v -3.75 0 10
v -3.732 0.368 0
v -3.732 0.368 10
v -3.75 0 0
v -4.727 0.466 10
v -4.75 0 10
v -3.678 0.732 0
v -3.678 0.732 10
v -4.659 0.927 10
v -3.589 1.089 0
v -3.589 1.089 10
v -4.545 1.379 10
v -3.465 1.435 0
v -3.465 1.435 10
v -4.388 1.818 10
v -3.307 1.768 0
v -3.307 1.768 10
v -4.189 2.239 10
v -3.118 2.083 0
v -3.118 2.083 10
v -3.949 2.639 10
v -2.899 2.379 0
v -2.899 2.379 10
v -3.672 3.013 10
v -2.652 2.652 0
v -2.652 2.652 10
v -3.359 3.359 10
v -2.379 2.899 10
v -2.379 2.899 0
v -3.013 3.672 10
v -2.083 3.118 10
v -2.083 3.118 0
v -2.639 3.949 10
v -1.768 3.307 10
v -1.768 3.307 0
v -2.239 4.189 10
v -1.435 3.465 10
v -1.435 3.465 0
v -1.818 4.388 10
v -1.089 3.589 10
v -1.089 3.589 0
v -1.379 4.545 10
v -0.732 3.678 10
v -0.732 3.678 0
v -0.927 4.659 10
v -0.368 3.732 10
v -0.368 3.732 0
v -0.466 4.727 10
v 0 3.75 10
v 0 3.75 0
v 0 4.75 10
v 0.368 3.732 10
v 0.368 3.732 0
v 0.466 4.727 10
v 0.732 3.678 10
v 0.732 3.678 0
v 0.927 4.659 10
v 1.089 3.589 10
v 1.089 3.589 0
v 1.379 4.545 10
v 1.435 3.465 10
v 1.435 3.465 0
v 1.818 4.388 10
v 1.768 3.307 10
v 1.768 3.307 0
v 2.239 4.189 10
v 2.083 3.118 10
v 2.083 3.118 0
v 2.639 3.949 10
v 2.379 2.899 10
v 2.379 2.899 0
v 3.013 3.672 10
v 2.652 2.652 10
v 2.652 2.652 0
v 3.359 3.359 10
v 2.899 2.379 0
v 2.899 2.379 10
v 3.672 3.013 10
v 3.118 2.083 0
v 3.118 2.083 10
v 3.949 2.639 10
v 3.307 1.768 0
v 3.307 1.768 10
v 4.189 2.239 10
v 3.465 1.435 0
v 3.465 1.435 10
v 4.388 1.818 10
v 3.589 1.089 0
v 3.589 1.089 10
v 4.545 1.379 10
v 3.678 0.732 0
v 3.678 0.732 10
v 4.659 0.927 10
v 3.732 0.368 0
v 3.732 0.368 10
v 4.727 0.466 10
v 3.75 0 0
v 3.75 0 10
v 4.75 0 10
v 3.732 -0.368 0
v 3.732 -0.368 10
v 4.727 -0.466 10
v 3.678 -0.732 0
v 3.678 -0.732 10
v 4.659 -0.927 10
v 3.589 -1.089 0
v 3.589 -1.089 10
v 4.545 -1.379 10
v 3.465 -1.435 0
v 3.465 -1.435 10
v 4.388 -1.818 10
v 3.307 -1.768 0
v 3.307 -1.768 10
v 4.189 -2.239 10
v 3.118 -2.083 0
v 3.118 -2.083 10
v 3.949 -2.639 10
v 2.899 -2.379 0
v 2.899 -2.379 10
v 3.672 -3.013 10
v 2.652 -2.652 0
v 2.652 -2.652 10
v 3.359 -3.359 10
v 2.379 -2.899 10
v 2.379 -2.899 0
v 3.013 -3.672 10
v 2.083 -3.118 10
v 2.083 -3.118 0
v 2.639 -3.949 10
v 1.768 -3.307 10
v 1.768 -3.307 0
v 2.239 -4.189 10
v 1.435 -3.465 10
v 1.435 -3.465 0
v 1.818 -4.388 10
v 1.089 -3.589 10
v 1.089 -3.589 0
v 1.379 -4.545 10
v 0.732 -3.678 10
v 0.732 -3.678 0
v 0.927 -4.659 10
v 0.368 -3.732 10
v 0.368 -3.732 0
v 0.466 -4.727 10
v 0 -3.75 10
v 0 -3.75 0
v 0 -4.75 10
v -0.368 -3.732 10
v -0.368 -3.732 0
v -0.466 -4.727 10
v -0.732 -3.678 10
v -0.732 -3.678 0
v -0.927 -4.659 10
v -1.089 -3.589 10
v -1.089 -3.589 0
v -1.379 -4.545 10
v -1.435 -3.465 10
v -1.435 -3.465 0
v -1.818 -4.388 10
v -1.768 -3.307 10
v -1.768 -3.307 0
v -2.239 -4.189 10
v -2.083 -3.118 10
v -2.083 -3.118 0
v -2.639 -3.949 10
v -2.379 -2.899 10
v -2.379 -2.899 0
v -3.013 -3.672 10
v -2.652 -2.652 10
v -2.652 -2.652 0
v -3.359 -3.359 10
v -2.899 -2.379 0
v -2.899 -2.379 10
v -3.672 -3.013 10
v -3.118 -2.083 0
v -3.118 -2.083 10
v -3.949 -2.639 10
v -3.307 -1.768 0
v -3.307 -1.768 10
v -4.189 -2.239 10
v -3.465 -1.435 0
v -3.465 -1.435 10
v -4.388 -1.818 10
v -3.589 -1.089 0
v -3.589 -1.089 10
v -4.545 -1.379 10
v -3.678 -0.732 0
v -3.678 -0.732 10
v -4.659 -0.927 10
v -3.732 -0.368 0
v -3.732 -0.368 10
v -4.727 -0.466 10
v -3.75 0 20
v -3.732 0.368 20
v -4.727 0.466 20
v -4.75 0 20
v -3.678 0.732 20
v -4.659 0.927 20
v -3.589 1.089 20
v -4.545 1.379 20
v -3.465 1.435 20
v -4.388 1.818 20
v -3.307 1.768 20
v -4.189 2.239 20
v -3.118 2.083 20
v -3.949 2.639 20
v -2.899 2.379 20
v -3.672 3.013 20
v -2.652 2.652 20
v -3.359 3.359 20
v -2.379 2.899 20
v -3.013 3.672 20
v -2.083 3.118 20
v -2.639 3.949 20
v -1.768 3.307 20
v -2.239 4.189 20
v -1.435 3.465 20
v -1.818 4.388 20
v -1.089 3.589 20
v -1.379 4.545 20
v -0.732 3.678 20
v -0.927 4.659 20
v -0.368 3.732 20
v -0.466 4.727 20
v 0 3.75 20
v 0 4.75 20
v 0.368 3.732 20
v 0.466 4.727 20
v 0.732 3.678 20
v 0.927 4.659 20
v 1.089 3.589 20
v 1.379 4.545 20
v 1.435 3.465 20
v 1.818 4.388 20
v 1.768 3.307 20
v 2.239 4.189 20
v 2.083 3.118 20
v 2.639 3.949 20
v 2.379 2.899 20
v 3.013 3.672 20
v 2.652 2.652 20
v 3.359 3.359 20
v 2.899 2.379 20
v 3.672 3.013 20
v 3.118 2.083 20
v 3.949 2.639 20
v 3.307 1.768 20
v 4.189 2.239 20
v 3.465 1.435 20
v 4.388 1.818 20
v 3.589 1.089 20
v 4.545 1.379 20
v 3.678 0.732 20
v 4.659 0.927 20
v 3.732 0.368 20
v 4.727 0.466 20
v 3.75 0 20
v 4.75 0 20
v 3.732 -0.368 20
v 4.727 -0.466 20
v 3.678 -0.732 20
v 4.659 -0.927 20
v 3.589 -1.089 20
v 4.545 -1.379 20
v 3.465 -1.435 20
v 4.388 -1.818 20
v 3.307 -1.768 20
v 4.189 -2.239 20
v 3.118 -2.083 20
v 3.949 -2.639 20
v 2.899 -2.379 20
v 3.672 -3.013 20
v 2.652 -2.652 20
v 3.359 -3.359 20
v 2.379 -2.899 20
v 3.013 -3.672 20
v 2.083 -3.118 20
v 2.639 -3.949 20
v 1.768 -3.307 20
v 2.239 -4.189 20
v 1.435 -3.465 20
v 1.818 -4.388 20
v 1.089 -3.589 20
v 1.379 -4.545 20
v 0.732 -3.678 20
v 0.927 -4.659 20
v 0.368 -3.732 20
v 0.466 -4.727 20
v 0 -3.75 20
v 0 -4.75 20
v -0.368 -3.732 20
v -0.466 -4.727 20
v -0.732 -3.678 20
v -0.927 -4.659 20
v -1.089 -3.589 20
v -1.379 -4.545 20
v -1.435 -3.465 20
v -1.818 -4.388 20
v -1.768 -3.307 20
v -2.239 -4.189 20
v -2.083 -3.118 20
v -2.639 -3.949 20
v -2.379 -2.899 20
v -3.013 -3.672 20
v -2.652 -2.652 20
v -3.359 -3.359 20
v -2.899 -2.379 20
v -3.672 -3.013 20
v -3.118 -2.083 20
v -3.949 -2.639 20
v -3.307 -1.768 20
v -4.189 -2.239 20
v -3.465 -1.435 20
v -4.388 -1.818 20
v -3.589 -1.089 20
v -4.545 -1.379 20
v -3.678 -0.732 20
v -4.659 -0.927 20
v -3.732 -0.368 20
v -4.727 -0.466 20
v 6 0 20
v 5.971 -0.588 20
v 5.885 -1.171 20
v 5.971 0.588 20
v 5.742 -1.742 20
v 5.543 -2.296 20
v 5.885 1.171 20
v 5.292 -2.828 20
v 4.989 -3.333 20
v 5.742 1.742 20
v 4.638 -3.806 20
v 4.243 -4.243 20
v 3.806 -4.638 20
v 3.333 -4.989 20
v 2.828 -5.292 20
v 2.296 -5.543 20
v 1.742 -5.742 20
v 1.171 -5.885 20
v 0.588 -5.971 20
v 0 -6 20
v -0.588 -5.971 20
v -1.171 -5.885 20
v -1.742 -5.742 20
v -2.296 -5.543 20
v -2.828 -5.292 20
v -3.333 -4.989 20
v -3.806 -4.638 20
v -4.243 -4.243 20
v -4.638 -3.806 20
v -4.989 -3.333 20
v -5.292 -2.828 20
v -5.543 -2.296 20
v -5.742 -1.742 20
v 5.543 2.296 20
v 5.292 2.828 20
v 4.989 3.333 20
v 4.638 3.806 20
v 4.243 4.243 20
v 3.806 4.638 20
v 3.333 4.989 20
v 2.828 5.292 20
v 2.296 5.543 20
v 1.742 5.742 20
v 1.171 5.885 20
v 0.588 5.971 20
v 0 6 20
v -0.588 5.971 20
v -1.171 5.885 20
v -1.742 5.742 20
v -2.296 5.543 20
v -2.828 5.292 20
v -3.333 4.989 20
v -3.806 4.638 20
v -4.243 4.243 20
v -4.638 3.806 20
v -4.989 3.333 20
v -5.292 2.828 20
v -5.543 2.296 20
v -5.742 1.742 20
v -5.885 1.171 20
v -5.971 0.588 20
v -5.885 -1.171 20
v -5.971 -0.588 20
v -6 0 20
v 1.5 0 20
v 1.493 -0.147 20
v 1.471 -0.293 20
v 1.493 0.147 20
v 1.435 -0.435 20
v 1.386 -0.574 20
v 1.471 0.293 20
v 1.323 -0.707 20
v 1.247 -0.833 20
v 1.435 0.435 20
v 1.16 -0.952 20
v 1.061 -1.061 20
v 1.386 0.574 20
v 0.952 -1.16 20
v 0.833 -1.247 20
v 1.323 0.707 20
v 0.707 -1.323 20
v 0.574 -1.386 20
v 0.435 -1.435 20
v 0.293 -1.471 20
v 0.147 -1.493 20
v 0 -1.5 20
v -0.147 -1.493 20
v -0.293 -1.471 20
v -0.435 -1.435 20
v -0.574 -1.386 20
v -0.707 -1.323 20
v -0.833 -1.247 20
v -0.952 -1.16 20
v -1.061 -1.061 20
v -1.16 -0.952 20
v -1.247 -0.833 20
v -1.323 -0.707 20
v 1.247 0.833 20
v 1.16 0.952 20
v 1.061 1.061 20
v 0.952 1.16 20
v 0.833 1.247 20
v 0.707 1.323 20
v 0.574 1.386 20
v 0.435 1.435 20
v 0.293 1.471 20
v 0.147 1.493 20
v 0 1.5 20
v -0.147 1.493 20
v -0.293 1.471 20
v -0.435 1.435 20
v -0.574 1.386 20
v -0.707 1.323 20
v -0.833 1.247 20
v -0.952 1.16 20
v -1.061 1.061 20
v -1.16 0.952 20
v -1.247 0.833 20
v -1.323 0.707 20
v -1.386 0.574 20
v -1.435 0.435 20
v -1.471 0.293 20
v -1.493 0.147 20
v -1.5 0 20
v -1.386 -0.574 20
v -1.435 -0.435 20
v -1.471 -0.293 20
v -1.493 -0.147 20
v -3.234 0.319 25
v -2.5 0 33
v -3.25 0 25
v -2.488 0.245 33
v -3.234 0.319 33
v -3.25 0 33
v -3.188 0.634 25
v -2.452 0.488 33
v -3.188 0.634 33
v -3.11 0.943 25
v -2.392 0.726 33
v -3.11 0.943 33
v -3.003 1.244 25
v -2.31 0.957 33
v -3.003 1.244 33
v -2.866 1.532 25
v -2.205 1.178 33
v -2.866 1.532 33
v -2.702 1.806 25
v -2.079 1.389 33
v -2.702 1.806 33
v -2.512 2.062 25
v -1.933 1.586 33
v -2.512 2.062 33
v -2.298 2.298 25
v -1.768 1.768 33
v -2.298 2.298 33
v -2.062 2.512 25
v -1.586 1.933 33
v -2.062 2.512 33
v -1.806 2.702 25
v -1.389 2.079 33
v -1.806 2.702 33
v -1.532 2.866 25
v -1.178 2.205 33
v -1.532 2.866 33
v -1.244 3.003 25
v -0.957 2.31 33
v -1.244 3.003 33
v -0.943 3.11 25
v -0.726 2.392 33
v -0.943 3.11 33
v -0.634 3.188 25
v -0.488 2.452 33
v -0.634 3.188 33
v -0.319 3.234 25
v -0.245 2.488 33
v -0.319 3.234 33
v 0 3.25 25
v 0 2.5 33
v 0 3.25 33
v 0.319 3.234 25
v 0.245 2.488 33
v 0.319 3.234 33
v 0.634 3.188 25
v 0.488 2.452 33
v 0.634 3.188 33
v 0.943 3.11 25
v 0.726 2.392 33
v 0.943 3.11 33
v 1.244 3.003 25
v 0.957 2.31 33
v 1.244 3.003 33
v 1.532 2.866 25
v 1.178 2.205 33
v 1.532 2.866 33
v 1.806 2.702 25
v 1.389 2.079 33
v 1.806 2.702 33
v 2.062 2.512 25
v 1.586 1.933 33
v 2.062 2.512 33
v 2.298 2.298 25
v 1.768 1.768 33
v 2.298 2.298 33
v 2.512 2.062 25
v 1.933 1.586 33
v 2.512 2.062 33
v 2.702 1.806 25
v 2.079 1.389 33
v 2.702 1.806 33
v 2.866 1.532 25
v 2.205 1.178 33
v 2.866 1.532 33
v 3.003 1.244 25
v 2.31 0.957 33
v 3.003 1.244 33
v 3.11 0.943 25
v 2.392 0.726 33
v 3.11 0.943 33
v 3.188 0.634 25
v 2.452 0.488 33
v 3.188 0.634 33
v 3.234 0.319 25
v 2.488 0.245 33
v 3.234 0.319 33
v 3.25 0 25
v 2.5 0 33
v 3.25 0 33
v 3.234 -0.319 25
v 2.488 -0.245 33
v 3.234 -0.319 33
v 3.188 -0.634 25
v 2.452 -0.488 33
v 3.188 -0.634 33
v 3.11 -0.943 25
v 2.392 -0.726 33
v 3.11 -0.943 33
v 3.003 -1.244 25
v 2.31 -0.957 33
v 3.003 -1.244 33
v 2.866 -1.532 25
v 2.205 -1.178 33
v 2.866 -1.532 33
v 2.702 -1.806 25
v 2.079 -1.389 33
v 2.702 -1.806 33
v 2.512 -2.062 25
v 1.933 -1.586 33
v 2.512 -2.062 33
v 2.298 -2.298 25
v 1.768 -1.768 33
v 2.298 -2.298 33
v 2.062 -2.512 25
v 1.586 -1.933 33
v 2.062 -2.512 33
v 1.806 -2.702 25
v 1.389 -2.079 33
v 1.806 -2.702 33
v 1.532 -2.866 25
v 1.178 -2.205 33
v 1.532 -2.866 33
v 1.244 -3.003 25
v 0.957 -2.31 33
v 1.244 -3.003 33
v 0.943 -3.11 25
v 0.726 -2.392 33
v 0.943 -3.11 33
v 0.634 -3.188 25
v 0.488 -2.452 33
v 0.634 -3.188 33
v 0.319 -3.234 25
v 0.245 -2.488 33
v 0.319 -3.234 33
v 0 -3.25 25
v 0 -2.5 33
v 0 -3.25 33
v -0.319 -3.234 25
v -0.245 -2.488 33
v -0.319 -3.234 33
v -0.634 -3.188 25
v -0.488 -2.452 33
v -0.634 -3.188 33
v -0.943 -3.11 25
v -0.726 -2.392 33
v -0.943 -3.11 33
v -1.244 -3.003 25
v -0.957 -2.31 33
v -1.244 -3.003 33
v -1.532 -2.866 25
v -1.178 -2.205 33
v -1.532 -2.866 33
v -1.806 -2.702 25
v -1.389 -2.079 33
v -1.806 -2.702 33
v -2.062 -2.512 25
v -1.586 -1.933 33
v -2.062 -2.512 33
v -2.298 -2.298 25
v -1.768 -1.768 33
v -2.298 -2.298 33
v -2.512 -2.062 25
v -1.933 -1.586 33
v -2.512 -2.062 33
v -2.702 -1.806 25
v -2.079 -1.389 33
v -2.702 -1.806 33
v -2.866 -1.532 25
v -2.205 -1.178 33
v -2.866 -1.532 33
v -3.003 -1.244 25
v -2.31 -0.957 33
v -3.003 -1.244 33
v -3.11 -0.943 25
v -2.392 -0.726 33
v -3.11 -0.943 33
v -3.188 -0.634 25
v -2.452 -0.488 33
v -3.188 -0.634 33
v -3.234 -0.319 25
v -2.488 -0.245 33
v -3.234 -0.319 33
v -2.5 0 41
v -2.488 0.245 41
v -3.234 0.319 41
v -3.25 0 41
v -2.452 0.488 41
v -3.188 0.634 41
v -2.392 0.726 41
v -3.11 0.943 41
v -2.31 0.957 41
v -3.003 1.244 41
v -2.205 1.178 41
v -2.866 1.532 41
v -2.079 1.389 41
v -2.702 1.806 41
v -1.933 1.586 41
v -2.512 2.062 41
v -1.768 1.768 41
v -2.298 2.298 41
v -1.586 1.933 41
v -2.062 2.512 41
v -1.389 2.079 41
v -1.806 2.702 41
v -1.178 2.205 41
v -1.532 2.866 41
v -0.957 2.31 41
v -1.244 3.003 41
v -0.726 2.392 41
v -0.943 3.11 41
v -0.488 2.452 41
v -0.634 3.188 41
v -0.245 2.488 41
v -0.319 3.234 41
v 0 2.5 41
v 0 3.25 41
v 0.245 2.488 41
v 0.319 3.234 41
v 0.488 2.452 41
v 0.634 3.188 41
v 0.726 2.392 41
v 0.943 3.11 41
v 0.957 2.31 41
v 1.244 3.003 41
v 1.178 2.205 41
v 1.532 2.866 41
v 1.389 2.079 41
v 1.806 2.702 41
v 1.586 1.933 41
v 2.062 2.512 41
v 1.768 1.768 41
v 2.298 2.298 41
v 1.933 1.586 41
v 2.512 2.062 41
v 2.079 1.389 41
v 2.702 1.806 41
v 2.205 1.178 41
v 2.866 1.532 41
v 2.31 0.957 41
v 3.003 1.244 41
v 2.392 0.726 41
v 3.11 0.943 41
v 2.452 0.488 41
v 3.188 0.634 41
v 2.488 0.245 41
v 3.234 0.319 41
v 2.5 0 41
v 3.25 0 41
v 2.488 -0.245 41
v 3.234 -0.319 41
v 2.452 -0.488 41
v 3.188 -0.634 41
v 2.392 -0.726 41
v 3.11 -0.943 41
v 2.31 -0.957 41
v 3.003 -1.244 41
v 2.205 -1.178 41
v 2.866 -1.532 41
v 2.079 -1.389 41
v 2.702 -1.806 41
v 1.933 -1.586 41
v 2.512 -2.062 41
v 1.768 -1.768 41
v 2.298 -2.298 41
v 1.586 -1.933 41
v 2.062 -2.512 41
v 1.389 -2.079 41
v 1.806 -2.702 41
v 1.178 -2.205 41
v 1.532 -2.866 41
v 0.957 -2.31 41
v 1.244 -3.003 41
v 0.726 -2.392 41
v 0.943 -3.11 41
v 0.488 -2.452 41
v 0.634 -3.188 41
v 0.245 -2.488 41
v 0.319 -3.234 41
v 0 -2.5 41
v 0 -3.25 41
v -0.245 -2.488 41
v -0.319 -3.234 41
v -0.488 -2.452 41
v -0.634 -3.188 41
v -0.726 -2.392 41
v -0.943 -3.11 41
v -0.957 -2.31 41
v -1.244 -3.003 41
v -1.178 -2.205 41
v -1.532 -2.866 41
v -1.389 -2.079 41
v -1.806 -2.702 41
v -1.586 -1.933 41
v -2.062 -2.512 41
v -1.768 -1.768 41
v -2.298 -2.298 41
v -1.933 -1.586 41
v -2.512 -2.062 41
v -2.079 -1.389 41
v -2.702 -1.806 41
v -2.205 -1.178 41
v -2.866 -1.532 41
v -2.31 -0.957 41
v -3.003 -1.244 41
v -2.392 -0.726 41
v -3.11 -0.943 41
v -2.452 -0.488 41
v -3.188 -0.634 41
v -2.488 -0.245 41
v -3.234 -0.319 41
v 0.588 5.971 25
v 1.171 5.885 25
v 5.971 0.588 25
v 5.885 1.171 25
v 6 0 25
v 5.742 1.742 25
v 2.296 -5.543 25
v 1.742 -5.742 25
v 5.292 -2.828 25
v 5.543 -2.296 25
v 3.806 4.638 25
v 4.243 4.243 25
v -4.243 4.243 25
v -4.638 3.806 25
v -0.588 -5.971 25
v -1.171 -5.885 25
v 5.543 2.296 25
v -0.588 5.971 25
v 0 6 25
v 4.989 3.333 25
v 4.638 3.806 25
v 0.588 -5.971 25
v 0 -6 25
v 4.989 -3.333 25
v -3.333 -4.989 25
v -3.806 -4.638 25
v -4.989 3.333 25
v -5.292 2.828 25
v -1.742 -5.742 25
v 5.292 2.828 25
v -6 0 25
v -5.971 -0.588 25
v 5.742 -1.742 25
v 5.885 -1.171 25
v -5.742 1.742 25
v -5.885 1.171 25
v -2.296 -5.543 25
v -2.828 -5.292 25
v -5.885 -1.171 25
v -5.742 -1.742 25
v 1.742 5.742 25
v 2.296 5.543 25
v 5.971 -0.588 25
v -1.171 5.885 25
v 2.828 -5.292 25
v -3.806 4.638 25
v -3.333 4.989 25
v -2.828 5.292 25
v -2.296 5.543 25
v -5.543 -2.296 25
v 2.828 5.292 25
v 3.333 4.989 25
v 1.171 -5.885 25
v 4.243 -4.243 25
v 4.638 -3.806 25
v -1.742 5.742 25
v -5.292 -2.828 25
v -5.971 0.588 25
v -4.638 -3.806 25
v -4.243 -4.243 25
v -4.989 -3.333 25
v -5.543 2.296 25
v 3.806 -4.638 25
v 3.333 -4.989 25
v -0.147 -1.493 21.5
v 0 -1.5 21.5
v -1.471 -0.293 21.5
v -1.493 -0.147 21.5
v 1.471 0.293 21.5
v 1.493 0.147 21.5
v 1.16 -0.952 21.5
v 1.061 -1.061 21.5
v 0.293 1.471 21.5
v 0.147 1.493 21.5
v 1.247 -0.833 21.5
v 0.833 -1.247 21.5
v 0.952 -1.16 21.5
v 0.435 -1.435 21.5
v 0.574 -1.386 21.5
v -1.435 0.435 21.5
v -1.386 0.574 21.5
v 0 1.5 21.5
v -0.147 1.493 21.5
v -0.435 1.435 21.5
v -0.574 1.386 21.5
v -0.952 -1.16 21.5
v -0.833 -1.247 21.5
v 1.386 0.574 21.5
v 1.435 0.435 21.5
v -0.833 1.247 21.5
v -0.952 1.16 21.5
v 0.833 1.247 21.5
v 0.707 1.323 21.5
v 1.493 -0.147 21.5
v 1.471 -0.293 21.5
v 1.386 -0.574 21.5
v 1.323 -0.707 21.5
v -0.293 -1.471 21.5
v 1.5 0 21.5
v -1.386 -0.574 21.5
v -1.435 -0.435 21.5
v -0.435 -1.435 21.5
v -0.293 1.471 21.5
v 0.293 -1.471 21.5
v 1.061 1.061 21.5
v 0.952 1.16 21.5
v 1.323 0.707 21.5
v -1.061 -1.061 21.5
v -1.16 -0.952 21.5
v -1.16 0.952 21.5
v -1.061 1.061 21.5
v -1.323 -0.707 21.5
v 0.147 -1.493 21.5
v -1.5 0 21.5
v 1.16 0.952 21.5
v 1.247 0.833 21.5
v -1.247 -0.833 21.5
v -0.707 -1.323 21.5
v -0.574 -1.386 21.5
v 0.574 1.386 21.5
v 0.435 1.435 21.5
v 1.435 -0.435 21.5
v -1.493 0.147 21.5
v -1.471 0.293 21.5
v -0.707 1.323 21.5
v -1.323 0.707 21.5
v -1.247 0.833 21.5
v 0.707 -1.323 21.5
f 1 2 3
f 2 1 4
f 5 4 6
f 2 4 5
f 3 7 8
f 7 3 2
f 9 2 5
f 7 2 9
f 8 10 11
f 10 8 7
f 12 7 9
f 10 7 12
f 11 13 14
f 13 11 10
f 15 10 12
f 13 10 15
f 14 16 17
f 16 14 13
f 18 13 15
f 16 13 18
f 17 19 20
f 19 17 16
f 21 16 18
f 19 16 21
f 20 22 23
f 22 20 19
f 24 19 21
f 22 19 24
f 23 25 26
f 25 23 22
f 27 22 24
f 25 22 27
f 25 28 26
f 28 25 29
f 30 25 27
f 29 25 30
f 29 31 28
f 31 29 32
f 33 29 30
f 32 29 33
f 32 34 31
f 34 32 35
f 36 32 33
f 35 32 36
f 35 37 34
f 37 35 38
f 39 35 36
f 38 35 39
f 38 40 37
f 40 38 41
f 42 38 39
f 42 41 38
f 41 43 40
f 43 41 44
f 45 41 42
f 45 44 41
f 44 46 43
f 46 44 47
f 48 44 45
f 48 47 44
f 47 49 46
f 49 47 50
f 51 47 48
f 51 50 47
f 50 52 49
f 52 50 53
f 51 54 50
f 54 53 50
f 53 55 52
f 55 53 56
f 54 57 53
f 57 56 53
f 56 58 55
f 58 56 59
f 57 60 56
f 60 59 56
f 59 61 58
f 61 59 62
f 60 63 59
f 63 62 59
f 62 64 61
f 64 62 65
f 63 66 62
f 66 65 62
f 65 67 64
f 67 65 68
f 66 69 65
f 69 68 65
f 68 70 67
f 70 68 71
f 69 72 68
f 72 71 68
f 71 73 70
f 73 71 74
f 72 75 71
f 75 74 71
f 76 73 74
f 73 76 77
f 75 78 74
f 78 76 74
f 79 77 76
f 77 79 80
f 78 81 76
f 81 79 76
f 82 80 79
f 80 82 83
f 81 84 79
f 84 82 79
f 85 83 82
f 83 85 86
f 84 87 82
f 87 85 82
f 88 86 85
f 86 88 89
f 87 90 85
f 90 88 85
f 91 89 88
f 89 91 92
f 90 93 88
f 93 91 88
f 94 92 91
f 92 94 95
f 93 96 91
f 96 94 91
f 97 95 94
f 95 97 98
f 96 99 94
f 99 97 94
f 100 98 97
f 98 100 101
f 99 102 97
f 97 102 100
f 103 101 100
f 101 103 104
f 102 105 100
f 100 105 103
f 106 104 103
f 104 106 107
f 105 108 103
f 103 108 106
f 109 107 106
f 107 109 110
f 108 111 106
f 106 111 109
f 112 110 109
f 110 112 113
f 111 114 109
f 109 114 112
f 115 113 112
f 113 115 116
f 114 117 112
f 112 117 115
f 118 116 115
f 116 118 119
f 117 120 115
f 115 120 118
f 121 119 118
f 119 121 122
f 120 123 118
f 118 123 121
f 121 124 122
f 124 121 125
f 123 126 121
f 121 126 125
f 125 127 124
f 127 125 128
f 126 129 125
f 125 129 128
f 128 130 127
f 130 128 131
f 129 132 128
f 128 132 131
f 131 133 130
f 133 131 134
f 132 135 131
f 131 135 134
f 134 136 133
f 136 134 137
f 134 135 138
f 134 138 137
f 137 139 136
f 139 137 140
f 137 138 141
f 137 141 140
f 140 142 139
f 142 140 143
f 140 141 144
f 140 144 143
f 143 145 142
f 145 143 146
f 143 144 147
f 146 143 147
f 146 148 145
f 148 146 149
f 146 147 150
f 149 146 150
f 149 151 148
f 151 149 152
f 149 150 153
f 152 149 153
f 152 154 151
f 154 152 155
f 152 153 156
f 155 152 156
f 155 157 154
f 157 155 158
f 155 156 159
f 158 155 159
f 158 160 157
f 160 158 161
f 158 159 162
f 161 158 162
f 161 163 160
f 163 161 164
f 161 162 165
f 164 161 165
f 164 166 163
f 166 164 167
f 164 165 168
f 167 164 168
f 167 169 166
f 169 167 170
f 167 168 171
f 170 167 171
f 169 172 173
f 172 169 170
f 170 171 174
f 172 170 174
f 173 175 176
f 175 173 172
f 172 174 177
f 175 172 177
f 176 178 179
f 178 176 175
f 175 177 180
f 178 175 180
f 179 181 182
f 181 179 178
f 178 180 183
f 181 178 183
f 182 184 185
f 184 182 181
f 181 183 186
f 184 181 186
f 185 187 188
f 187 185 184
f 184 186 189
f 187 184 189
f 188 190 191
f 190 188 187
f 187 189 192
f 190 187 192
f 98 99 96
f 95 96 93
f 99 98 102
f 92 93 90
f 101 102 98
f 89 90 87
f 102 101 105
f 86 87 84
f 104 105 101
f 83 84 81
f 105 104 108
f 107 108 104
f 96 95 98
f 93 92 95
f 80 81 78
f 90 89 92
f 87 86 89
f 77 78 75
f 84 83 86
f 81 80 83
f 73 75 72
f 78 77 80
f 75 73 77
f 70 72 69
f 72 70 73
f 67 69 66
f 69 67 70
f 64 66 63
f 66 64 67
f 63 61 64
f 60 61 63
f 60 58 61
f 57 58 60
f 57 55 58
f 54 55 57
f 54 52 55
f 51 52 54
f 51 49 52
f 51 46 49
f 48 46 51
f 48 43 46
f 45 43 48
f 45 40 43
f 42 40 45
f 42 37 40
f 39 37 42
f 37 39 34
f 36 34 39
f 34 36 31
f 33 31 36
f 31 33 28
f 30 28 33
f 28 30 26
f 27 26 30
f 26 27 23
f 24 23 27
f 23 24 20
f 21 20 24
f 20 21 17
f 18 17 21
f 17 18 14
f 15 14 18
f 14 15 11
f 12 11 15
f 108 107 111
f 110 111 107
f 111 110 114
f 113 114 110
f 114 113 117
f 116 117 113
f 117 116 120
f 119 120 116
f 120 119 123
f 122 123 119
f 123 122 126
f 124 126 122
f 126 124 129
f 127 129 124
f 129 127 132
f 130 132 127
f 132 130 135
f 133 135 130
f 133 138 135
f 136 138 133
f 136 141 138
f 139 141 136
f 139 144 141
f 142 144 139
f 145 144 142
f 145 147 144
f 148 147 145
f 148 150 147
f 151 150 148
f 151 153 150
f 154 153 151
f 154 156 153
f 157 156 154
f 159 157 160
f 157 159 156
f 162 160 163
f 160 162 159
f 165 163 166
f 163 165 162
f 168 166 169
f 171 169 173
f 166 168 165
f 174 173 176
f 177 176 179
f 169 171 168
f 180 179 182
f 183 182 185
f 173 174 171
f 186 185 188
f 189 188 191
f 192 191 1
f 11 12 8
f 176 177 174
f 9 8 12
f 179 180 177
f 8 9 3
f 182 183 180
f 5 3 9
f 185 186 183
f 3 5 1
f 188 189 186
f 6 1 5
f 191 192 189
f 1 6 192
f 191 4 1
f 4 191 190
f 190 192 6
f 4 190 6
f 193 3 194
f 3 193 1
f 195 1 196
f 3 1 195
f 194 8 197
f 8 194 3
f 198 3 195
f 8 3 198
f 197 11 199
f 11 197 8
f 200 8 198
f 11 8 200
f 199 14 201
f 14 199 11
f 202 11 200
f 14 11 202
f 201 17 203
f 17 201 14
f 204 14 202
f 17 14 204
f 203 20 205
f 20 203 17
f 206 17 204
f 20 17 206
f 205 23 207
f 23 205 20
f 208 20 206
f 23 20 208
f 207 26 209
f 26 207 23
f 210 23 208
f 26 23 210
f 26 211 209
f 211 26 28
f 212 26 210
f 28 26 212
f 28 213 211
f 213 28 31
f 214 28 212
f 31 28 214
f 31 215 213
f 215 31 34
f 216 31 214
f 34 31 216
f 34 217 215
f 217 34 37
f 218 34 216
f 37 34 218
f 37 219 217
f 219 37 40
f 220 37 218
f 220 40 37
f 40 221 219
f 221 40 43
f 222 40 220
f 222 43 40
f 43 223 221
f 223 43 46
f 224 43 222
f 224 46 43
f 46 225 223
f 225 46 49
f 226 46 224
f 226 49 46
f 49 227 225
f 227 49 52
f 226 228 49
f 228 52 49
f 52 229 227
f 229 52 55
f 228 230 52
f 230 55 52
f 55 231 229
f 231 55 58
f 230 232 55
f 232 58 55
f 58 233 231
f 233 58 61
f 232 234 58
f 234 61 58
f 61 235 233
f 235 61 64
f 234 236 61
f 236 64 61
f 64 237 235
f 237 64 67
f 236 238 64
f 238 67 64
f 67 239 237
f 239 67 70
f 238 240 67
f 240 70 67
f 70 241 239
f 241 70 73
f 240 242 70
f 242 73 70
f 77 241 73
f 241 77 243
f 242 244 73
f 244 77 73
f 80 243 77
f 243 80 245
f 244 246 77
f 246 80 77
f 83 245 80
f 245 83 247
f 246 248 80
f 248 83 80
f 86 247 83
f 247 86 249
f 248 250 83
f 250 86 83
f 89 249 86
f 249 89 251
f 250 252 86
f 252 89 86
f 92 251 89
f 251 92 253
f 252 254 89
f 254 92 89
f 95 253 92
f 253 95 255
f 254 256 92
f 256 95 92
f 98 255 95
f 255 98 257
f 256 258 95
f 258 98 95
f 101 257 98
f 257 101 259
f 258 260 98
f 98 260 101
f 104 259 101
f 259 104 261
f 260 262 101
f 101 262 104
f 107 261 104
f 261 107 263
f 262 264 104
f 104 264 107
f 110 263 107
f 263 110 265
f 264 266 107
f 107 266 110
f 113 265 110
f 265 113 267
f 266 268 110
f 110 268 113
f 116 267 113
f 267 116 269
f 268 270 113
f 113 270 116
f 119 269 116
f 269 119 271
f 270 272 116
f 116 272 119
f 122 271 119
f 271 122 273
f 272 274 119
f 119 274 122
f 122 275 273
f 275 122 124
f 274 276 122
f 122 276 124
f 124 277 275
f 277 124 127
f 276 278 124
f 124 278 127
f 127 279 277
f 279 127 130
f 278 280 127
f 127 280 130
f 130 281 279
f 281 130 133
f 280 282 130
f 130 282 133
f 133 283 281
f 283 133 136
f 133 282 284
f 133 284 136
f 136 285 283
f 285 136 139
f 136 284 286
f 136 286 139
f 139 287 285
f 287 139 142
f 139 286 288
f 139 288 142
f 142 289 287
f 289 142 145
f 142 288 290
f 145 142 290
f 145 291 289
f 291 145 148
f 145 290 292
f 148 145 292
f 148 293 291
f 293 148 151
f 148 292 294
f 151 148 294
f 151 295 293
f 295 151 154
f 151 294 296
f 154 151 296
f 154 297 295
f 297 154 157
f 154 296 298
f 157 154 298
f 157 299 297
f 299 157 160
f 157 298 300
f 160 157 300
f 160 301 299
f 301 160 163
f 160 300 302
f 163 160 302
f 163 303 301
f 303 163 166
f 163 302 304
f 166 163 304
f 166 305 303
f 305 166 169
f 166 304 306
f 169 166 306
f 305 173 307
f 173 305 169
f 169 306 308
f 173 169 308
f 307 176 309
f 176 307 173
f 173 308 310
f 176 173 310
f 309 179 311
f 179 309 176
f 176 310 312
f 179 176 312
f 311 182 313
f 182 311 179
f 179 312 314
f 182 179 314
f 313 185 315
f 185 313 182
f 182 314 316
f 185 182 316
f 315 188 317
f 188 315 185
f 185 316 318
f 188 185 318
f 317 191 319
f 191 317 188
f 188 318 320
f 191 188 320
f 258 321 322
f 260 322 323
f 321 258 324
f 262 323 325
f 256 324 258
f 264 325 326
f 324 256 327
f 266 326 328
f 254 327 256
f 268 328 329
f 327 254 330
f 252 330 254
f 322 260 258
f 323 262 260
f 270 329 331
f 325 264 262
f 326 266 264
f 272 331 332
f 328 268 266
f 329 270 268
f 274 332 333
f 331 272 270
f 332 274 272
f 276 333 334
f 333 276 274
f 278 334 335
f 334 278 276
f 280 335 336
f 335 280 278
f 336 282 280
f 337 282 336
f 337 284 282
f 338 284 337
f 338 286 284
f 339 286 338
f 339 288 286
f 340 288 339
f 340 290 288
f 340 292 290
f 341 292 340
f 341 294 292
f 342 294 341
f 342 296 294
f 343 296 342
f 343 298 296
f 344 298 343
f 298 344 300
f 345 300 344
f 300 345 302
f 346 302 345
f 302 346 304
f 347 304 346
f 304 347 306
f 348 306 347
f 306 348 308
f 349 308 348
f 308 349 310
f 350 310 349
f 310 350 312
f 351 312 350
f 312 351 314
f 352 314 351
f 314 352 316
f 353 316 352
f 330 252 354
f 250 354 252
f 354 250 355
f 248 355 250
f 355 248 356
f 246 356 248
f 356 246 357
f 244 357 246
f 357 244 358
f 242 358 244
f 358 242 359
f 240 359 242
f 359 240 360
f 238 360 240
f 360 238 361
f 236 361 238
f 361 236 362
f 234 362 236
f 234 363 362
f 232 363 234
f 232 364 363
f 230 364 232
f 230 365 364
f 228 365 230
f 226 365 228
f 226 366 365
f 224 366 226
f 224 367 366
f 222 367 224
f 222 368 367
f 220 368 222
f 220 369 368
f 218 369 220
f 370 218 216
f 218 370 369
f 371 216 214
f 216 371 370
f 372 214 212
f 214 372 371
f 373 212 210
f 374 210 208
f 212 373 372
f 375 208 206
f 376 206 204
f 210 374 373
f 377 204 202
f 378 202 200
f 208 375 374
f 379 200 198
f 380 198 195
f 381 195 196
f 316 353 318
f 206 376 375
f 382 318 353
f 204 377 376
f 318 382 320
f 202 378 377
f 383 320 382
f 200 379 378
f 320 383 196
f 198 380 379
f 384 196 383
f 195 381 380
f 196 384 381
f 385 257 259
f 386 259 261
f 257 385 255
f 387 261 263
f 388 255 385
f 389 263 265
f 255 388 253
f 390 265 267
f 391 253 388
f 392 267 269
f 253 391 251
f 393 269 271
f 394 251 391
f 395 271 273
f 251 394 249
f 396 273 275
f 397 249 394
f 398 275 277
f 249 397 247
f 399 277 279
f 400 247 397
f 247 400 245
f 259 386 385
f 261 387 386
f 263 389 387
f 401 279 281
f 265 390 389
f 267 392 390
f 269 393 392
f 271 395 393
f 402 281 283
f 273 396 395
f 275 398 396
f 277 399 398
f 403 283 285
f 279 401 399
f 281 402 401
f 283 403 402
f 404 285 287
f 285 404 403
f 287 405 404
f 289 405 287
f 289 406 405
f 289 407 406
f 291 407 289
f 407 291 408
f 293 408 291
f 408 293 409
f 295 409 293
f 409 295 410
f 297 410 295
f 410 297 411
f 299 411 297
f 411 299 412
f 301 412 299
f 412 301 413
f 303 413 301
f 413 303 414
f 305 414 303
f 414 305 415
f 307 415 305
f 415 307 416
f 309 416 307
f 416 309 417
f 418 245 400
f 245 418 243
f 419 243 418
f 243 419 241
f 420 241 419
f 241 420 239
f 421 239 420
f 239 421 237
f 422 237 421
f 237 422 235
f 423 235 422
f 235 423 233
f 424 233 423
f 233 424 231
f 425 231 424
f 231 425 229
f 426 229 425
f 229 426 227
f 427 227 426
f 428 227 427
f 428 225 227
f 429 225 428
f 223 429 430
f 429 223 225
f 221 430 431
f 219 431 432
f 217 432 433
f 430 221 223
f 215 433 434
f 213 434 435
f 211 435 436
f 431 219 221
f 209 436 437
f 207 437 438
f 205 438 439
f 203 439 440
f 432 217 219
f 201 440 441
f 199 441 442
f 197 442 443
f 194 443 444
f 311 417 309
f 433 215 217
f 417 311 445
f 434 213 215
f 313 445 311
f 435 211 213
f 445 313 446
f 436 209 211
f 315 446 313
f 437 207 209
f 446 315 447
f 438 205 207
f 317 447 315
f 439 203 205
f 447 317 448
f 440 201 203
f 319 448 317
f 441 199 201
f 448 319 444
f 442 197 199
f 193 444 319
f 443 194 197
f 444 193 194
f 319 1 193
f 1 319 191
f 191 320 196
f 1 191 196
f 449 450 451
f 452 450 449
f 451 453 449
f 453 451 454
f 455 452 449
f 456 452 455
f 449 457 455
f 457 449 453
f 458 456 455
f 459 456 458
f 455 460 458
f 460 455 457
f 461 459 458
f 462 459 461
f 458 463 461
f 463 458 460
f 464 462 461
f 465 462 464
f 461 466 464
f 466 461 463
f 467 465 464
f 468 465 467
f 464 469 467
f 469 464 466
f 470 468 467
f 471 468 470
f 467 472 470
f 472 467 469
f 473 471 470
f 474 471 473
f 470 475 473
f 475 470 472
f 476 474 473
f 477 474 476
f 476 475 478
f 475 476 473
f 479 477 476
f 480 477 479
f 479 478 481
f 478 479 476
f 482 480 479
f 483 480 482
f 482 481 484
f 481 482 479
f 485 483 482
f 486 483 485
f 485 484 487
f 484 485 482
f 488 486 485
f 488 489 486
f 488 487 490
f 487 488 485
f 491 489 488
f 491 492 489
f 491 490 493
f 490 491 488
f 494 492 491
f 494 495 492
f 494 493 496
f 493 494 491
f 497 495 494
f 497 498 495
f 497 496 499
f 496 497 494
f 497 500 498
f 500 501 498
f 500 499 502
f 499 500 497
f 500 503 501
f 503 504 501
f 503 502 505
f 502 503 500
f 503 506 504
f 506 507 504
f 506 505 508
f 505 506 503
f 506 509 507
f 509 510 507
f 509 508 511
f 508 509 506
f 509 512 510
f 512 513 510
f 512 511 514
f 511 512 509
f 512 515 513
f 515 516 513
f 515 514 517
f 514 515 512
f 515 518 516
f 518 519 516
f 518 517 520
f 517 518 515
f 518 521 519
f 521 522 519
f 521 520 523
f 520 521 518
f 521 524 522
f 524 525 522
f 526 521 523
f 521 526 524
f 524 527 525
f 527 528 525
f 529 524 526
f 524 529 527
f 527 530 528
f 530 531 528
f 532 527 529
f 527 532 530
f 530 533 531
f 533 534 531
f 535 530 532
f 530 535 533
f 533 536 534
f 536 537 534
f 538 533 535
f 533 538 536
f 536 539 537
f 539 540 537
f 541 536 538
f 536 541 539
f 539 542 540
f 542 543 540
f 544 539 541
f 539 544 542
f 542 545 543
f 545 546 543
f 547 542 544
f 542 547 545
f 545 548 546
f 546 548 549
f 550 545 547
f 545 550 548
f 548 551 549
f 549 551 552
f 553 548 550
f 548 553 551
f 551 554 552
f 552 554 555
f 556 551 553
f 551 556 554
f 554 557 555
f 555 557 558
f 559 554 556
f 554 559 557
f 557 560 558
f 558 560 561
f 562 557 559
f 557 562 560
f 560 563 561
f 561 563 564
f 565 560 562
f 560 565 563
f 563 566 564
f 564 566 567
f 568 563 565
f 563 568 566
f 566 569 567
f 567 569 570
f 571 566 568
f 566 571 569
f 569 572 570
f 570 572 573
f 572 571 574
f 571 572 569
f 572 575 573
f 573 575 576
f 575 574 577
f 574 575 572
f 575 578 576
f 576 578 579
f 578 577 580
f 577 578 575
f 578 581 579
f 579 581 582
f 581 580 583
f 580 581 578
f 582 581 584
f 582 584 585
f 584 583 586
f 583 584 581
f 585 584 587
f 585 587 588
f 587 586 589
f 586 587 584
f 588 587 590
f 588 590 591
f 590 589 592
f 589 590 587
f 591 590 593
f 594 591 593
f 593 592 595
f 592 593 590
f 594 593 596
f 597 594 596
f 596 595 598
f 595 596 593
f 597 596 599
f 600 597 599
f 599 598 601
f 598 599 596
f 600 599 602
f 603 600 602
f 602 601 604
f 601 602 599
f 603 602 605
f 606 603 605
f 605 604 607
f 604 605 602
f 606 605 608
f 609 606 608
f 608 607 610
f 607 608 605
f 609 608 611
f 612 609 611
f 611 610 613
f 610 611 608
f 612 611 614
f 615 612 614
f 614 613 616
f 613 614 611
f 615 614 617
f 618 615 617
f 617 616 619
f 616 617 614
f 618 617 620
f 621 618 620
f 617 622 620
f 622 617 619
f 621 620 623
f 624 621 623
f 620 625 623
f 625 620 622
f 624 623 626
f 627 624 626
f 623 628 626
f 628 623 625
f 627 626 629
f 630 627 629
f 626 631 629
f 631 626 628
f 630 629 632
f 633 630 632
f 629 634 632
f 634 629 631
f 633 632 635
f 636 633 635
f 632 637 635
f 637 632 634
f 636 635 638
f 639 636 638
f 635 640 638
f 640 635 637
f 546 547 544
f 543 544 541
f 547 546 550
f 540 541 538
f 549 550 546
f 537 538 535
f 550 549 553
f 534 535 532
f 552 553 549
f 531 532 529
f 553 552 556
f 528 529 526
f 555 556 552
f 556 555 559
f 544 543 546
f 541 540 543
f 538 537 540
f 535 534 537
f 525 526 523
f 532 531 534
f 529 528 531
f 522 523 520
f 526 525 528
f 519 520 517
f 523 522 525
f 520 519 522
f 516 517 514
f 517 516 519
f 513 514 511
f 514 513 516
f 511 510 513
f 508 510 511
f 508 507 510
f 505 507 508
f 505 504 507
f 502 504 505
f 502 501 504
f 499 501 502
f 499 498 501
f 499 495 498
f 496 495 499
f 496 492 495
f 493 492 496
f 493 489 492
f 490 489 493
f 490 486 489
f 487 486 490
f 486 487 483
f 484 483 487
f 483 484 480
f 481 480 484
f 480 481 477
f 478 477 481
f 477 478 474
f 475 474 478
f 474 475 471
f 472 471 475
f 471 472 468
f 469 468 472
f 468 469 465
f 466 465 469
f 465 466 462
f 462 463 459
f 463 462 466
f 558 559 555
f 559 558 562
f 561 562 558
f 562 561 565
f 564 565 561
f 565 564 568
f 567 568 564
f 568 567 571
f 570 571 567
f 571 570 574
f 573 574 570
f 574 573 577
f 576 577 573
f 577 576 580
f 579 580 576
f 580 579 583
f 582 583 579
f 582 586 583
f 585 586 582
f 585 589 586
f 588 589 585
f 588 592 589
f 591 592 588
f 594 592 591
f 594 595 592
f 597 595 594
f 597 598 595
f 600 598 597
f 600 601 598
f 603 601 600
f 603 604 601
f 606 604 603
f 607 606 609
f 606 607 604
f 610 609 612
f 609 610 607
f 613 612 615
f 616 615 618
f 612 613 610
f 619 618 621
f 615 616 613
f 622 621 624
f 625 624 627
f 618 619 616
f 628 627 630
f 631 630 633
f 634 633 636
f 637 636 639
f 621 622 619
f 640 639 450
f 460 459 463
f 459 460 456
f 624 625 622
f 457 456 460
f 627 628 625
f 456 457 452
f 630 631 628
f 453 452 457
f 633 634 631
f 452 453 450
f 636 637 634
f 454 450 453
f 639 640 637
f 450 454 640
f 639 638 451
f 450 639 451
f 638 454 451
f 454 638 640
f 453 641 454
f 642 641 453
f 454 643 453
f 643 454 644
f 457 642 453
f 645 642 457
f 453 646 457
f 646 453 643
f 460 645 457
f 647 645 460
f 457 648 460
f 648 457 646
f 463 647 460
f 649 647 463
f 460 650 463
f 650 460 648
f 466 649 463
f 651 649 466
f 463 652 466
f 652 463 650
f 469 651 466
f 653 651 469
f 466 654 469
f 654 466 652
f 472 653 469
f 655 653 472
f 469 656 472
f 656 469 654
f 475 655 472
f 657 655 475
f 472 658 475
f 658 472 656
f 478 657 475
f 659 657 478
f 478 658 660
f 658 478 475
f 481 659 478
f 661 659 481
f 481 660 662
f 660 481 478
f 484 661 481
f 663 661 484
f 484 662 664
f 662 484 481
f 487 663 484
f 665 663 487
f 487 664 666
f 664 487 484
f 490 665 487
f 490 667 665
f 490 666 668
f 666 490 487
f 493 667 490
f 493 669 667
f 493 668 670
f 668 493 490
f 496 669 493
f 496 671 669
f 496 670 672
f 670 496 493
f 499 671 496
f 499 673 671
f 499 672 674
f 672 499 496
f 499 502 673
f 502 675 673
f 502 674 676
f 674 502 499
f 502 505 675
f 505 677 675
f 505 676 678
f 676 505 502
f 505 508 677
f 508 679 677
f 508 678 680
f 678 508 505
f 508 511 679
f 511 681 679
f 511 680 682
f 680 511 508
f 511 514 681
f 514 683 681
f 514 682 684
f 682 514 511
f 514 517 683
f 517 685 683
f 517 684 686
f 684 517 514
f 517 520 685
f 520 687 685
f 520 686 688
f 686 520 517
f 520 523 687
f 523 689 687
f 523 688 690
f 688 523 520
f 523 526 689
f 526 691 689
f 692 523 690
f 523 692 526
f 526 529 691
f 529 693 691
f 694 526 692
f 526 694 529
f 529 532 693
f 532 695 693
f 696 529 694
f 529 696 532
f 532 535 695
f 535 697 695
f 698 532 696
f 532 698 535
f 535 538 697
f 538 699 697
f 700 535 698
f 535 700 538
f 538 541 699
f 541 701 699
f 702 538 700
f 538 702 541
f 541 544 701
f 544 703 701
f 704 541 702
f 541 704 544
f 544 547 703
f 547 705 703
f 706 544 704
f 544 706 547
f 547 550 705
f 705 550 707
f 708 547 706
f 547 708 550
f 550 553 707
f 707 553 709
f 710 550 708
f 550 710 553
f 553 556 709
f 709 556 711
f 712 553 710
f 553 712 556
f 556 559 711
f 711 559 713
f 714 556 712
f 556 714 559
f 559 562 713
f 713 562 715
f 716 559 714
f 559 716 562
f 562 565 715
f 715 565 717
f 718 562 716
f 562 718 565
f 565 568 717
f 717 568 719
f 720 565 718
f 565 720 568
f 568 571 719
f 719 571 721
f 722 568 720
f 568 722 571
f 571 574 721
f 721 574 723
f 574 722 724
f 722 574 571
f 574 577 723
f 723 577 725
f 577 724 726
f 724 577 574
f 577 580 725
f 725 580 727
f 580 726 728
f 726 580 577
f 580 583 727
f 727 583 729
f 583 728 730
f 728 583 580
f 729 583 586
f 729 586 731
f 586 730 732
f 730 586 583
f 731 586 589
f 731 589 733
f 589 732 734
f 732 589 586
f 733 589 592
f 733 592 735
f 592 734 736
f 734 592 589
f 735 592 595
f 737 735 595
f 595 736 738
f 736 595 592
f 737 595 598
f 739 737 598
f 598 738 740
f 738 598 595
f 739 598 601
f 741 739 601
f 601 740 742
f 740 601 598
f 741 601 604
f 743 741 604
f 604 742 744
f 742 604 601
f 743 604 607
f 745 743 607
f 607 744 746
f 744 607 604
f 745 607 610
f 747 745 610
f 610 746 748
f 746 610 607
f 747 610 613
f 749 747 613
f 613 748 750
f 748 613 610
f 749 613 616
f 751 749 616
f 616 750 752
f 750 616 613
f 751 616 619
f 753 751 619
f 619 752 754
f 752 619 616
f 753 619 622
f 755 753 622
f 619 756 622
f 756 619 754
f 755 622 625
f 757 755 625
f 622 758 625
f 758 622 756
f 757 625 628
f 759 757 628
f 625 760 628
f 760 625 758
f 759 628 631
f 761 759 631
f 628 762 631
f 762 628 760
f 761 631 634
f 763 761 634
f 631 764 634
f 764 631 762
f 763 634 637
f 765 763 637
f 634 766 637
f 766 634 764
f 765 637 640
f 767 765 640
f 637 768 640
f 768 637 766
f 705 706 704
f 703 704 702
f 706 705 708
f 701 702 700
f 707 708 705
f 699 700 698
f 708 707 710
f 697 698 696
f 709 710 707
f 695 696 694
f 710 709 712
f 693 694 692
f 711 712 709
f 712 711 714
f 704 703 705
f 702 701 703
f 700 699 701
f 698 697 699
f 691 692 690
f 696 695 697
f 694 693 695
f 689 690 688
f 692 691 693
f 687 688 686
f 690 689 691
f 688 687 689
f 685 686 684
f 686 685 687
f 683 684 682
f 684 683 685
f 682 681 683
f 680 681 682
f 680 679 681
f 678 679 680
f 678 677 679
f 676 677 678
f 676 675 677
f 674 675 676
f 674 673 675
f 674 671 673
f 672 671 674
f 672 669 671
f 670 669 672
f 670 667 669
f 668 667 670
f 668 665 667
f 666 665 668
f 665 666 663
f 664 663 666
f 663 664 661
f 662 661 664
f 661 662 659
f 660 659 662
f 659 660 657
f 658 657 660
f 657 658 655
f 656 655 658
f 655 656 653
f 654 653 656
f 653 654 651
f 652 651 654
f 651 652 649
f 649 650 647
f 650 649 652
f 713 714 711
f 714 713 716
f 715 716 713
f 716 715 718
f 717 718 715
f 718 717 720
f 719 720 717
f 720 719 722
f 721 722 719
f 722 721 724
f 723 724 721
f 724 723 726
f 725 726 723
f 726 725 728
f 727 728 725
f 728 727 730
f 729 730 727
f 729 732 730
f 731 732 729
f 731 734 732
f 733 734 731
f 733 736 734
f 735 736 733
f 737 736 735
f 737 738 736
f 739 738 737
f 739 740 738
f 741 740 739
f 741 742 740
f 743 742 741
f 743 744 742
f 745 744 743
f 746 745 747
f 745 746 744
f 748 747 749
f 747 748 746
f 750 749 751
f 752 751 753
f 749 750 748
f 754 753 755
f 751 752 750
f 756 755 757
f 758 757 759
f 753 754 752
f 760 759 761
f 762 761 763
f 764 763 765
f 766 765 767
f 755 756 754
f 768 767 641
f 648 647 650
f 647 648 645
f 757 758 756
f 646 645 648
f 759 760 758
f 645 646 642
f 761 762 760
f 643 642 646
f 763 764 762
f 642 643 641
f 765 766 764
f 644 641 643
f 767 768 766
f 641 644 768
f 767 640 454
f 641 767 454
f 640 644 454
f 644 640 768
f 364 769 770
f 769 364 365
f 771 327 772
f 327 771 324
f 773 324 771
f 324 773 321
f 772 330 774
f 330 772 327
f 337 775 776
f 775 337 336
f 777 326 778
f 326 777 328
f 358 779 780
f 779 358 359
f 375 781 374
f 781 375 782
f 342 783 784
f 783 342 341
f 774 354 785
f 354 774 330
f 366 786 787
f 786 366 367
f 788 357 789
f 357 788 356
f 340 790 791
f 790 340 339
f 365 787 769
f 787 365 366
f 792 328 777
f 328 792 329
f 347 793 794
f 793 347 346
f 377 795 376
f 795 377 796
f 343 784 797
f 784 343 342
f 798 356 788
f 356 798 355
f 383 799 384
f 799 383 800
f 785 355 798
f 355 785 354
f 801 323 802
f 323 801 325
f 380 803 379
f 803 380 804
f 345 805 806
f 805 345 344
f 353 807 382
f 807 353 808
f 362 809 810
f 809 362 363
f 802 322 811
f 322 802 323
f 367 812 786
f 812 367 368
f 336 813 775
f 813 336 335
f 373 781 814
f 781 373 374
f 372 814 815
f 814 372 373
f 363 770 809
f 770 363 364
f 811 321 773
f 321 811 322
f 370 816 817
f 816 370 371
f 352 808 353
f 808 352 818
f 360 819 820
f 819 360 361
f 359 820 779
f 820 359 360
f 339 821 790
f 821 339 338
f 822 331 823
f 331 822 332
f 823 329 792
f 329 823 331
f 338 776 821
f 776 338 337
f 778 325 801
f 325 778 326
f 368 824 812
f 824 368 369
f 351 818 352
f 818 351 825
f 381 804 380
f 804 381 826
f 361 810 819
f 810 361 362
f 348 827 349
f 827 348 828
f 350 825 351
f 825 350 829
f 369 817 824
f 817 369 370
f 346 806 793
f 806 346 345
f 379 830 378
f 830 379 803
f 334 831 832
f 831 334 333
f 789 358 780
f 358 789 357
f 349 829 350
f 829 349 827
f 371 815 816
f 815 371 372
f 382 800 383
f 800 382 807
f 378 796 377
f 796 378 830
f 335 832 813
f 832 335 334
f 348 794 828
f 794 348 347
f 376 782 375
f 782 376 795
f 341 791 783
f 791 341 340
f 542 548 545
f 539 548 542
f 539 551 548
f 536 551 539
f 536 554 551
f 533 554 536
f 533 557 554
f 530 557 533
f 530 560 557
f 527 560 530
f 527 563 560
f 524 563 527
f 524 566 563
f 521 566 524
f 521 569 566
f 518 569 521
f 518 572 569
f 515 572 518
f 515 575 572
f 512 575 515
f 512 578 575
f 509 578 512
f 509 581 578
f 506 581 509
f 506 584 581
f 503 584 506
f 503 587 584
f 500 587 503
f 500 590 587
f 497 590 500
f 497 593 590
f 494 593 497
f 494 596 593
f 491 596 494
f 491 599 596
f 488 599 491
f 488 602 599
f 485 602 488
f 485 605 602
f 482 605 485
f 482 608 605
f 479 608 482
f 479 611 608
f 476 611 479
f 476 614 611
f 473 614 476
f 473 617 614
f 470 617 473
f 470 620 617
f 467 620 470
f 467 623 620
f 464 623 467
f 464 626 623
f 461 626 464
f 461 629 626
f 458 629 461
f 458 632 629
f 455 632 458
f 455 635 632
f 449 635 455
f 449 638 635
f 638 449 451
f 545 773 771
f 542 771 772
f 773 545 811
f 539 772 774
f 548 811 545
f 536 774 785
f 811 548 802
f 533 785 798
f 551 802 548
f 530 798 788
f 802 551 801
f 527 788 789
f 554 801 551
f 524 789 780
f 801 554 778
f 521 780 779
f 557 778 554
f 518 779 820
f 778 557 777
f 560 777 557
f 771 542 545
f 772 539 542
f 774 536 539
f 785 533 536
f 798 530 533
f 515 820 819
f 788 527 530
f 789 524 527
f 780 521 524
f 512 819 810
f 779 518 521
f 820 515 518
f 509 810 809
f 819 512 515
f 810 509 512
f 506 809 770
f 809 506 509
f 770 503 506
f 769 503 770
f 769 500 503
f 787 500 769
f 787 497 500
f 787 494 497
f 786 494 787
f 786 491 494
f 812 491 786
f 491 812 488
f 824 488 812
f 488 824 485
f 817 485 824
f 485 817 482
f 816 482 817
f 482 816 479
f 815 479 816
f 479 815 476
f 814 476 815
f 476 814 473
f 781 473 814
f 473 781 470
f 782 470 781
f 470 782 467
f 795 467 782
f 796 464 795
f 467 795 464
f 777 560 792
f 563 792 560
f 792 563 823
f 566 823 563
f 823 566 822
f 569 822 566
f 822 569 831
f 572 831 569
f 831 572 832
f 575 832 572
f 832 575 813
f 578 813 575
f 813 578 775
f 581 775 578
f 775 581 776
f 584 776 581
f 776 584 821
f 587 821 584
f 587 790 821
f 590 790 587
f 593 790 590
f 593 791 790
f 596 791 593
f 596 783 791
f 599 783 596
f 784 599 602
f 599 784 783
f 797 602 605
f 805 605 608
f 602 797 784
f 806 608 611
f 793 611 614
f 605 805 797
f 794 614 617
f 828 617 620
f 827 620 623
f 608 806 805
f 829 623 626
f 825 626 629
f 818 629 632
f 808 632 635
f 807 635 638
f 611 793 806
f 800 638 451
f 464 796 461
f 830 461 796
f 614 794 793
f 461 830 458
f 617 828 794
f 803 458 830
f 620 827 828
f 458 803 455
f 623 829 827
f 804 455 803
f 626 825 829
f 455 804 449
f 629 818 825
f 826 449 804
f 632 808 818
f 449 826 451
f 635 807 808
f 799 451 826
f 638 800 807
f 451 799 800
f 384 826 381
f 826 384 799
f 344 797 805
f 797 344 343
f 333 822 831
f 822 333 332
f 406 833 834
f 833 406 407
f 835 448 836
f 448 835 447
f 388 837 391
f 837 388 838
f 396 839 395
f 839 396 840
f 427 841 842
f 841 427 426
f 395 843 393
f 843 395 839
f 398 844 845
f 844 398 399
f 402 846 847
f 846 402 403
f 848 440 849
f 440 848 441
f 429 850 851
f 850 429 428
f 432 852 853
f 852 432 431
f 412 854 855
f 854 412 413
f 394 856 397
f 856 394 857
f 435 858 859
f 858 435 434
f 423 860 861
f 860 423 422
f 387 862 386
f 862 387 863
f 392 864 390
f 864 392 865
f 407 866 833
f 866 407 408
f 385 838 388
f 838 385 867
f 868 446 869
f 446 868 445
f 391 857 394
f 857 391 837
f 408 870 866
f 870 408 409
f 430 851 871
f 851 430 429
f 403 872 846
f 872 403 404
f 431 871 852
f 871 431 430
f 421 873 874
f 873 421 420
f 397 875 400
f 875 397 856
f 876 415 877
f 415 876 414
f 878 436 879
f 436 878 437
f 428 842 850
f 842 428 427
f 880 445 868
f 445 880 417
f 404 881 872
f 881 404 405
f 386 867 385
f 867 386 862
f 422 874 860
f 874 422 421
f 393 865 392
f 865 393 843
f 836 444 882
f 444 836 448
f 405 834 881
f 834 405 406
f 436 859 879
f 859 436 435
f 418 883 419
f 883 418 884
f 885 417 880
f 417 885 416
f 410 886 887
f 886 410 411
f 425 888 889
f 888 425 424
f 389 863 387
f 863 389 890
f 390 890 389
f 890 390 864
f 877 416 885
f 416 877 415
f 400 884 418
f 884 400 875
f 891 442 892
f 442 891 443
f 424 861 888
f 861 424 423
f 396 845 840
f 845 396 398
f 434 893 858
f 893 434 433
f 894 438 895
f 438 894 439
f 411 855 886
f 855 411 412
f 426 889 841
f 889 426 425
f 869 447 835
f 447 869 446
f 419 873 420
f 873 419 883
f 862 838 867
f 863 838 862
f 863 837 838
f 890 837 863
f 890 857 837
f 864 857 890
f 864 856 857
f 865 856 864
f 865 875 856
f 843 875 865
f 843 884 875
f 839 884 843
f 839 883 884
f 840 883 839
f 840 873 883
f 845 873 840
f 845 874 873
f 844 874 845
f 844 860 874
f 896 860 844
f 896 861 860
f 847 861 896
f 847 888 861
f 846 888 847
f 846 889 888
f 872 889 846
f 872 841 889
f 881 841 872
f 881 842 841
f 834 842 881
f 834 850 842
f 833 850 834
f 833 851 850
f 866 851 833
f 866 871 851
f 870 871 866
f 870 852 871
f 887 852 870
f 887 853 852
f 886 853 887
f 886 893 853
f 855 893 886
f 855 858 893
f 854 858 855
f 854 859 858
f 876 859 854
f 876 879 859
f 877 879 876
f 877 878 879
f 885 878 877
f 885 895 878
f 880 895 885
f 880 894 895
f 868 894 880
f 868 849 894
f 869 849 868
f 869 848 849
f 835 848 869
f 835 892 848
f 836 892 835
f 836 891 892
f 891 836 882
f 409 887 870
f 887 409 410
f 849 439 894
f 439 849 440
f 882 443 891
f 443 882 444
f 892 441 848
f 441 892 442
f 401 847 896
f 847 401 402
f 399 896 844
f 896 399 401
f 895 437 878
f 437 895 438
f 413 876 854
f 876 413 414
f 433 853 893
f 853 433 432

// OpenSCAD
// Hose Barb Reducer: 8mm ID to 5mm ID
// Designed for FDM printing, standing upright on Z axis.

// Global settings
$fn = 64; // High resolution for round holes

// --- Dimensions for 8mm Tubing Barbs (Bottom Section) ---
OD_8mm_bottom = 7.5;  // Outer diameter at base of barb
OD_8mm_top = 9.5;     // Outer diameter at peak of barb
Barb8_Height = 10;    // Height of each 8mm barb
Barb8_Count = 2;      // Number of barbs for 8mm side

// --- Dimensions for Collar (Middle Section) ---
Collar_Height = 5;    // Height of the collar (z=20 to z=25)
Collar_OD = 12;       // Outer diameter of the collar

// --- Dimensions for 5mm Tubing Barbs (Top Section) ---
OD_5mm_bottom = 6.5;  // Outer diameter at base of barb
OD_5mm_top = 5.0;     // Outer diameter at peak of barb
Barb5_Height = 8;     // Height of each 5mm barb
Barb5_Count = 2;      // Number of barbs for 5mm side

// --- Bore ---
Bore_Diameter = 3;    // Inner diameter of the through-hole

// --- Helper Module: Sawtooth Barb Profile ---
// Creates a single barb profile in 2D (XY plane)
// x_start: radius at bottom
// x_end: radius at top
// height: height of the barb
module barb_profile(x_start, x_end, height) {
    // The profile is a trapezoid that steps back.
    // Points: (x_start, 0) -> (x_end, height) -> (x_start, height) -> (x_start, 0)
    // Note: For the 5mm side, x_start > x_end, so it shrinks then steps out.
    polygon(points = [
        [x_start, 0],
        [x_end, height],
        [x_start, height],
        [x_start, 0]
    ]);
}

// --- Main Body Construction ---
difference() {
    union() {
        // 1. Bottom Barbs (8mm tubing)
        // Located from z=0 to z=20
        for (i = [0 : Barb8_Count - 1]) {
            translate([0, 0, i * Barb8_Height]) {
                rotate_extrude() {
                    barb_profile(OD_8mm_bottom / 2, OD_8mm_top / 2, Barb8_Height);
                }
            }
        }

        // 2. Collar
        // Located from z=20 to z=25
        translate([0, 0, Barb8_Count * Barb8_Height]) {
            cylinder(h = Collar_Height, r = Collar_OD / 2, center = false);
        }

        // 3. Top Barbs (5mm tubing)
        // Located from z=25 to z=41
        // Base z for top barbs is 20 (end of bottom barbs) + 5 (collar) = 25
        base_z_top = Barb8_Count * Barb8_Height + Collar_Height;
        for (i = [0 : Barb5_Count - 1]) {
            translate([0, 0, base_z_top + i * Barb5_Height]) {
                rotate_extrude() {
                    barb_profile(OD_5mm_bottom / 2, OD_5mm_top / 2, Barb5_Height);
                }
            }
        }
    }

    // 4. Bore Hole
    // Runs through the entire length. 
    // Total height = 20 (bottom barbs) + 5 (collar) + 16 (top barbs) = 41 mm
    total_height = Barb8_Count * Barb8_Height + Collar_Height + Barb5_Count * Barb5_Height;
    // Extend hole slightly past top and bottom to ensure clean cut
    cylinder(h = total_height + 2, r = Bore_Diameter / 2, center = true);
}
